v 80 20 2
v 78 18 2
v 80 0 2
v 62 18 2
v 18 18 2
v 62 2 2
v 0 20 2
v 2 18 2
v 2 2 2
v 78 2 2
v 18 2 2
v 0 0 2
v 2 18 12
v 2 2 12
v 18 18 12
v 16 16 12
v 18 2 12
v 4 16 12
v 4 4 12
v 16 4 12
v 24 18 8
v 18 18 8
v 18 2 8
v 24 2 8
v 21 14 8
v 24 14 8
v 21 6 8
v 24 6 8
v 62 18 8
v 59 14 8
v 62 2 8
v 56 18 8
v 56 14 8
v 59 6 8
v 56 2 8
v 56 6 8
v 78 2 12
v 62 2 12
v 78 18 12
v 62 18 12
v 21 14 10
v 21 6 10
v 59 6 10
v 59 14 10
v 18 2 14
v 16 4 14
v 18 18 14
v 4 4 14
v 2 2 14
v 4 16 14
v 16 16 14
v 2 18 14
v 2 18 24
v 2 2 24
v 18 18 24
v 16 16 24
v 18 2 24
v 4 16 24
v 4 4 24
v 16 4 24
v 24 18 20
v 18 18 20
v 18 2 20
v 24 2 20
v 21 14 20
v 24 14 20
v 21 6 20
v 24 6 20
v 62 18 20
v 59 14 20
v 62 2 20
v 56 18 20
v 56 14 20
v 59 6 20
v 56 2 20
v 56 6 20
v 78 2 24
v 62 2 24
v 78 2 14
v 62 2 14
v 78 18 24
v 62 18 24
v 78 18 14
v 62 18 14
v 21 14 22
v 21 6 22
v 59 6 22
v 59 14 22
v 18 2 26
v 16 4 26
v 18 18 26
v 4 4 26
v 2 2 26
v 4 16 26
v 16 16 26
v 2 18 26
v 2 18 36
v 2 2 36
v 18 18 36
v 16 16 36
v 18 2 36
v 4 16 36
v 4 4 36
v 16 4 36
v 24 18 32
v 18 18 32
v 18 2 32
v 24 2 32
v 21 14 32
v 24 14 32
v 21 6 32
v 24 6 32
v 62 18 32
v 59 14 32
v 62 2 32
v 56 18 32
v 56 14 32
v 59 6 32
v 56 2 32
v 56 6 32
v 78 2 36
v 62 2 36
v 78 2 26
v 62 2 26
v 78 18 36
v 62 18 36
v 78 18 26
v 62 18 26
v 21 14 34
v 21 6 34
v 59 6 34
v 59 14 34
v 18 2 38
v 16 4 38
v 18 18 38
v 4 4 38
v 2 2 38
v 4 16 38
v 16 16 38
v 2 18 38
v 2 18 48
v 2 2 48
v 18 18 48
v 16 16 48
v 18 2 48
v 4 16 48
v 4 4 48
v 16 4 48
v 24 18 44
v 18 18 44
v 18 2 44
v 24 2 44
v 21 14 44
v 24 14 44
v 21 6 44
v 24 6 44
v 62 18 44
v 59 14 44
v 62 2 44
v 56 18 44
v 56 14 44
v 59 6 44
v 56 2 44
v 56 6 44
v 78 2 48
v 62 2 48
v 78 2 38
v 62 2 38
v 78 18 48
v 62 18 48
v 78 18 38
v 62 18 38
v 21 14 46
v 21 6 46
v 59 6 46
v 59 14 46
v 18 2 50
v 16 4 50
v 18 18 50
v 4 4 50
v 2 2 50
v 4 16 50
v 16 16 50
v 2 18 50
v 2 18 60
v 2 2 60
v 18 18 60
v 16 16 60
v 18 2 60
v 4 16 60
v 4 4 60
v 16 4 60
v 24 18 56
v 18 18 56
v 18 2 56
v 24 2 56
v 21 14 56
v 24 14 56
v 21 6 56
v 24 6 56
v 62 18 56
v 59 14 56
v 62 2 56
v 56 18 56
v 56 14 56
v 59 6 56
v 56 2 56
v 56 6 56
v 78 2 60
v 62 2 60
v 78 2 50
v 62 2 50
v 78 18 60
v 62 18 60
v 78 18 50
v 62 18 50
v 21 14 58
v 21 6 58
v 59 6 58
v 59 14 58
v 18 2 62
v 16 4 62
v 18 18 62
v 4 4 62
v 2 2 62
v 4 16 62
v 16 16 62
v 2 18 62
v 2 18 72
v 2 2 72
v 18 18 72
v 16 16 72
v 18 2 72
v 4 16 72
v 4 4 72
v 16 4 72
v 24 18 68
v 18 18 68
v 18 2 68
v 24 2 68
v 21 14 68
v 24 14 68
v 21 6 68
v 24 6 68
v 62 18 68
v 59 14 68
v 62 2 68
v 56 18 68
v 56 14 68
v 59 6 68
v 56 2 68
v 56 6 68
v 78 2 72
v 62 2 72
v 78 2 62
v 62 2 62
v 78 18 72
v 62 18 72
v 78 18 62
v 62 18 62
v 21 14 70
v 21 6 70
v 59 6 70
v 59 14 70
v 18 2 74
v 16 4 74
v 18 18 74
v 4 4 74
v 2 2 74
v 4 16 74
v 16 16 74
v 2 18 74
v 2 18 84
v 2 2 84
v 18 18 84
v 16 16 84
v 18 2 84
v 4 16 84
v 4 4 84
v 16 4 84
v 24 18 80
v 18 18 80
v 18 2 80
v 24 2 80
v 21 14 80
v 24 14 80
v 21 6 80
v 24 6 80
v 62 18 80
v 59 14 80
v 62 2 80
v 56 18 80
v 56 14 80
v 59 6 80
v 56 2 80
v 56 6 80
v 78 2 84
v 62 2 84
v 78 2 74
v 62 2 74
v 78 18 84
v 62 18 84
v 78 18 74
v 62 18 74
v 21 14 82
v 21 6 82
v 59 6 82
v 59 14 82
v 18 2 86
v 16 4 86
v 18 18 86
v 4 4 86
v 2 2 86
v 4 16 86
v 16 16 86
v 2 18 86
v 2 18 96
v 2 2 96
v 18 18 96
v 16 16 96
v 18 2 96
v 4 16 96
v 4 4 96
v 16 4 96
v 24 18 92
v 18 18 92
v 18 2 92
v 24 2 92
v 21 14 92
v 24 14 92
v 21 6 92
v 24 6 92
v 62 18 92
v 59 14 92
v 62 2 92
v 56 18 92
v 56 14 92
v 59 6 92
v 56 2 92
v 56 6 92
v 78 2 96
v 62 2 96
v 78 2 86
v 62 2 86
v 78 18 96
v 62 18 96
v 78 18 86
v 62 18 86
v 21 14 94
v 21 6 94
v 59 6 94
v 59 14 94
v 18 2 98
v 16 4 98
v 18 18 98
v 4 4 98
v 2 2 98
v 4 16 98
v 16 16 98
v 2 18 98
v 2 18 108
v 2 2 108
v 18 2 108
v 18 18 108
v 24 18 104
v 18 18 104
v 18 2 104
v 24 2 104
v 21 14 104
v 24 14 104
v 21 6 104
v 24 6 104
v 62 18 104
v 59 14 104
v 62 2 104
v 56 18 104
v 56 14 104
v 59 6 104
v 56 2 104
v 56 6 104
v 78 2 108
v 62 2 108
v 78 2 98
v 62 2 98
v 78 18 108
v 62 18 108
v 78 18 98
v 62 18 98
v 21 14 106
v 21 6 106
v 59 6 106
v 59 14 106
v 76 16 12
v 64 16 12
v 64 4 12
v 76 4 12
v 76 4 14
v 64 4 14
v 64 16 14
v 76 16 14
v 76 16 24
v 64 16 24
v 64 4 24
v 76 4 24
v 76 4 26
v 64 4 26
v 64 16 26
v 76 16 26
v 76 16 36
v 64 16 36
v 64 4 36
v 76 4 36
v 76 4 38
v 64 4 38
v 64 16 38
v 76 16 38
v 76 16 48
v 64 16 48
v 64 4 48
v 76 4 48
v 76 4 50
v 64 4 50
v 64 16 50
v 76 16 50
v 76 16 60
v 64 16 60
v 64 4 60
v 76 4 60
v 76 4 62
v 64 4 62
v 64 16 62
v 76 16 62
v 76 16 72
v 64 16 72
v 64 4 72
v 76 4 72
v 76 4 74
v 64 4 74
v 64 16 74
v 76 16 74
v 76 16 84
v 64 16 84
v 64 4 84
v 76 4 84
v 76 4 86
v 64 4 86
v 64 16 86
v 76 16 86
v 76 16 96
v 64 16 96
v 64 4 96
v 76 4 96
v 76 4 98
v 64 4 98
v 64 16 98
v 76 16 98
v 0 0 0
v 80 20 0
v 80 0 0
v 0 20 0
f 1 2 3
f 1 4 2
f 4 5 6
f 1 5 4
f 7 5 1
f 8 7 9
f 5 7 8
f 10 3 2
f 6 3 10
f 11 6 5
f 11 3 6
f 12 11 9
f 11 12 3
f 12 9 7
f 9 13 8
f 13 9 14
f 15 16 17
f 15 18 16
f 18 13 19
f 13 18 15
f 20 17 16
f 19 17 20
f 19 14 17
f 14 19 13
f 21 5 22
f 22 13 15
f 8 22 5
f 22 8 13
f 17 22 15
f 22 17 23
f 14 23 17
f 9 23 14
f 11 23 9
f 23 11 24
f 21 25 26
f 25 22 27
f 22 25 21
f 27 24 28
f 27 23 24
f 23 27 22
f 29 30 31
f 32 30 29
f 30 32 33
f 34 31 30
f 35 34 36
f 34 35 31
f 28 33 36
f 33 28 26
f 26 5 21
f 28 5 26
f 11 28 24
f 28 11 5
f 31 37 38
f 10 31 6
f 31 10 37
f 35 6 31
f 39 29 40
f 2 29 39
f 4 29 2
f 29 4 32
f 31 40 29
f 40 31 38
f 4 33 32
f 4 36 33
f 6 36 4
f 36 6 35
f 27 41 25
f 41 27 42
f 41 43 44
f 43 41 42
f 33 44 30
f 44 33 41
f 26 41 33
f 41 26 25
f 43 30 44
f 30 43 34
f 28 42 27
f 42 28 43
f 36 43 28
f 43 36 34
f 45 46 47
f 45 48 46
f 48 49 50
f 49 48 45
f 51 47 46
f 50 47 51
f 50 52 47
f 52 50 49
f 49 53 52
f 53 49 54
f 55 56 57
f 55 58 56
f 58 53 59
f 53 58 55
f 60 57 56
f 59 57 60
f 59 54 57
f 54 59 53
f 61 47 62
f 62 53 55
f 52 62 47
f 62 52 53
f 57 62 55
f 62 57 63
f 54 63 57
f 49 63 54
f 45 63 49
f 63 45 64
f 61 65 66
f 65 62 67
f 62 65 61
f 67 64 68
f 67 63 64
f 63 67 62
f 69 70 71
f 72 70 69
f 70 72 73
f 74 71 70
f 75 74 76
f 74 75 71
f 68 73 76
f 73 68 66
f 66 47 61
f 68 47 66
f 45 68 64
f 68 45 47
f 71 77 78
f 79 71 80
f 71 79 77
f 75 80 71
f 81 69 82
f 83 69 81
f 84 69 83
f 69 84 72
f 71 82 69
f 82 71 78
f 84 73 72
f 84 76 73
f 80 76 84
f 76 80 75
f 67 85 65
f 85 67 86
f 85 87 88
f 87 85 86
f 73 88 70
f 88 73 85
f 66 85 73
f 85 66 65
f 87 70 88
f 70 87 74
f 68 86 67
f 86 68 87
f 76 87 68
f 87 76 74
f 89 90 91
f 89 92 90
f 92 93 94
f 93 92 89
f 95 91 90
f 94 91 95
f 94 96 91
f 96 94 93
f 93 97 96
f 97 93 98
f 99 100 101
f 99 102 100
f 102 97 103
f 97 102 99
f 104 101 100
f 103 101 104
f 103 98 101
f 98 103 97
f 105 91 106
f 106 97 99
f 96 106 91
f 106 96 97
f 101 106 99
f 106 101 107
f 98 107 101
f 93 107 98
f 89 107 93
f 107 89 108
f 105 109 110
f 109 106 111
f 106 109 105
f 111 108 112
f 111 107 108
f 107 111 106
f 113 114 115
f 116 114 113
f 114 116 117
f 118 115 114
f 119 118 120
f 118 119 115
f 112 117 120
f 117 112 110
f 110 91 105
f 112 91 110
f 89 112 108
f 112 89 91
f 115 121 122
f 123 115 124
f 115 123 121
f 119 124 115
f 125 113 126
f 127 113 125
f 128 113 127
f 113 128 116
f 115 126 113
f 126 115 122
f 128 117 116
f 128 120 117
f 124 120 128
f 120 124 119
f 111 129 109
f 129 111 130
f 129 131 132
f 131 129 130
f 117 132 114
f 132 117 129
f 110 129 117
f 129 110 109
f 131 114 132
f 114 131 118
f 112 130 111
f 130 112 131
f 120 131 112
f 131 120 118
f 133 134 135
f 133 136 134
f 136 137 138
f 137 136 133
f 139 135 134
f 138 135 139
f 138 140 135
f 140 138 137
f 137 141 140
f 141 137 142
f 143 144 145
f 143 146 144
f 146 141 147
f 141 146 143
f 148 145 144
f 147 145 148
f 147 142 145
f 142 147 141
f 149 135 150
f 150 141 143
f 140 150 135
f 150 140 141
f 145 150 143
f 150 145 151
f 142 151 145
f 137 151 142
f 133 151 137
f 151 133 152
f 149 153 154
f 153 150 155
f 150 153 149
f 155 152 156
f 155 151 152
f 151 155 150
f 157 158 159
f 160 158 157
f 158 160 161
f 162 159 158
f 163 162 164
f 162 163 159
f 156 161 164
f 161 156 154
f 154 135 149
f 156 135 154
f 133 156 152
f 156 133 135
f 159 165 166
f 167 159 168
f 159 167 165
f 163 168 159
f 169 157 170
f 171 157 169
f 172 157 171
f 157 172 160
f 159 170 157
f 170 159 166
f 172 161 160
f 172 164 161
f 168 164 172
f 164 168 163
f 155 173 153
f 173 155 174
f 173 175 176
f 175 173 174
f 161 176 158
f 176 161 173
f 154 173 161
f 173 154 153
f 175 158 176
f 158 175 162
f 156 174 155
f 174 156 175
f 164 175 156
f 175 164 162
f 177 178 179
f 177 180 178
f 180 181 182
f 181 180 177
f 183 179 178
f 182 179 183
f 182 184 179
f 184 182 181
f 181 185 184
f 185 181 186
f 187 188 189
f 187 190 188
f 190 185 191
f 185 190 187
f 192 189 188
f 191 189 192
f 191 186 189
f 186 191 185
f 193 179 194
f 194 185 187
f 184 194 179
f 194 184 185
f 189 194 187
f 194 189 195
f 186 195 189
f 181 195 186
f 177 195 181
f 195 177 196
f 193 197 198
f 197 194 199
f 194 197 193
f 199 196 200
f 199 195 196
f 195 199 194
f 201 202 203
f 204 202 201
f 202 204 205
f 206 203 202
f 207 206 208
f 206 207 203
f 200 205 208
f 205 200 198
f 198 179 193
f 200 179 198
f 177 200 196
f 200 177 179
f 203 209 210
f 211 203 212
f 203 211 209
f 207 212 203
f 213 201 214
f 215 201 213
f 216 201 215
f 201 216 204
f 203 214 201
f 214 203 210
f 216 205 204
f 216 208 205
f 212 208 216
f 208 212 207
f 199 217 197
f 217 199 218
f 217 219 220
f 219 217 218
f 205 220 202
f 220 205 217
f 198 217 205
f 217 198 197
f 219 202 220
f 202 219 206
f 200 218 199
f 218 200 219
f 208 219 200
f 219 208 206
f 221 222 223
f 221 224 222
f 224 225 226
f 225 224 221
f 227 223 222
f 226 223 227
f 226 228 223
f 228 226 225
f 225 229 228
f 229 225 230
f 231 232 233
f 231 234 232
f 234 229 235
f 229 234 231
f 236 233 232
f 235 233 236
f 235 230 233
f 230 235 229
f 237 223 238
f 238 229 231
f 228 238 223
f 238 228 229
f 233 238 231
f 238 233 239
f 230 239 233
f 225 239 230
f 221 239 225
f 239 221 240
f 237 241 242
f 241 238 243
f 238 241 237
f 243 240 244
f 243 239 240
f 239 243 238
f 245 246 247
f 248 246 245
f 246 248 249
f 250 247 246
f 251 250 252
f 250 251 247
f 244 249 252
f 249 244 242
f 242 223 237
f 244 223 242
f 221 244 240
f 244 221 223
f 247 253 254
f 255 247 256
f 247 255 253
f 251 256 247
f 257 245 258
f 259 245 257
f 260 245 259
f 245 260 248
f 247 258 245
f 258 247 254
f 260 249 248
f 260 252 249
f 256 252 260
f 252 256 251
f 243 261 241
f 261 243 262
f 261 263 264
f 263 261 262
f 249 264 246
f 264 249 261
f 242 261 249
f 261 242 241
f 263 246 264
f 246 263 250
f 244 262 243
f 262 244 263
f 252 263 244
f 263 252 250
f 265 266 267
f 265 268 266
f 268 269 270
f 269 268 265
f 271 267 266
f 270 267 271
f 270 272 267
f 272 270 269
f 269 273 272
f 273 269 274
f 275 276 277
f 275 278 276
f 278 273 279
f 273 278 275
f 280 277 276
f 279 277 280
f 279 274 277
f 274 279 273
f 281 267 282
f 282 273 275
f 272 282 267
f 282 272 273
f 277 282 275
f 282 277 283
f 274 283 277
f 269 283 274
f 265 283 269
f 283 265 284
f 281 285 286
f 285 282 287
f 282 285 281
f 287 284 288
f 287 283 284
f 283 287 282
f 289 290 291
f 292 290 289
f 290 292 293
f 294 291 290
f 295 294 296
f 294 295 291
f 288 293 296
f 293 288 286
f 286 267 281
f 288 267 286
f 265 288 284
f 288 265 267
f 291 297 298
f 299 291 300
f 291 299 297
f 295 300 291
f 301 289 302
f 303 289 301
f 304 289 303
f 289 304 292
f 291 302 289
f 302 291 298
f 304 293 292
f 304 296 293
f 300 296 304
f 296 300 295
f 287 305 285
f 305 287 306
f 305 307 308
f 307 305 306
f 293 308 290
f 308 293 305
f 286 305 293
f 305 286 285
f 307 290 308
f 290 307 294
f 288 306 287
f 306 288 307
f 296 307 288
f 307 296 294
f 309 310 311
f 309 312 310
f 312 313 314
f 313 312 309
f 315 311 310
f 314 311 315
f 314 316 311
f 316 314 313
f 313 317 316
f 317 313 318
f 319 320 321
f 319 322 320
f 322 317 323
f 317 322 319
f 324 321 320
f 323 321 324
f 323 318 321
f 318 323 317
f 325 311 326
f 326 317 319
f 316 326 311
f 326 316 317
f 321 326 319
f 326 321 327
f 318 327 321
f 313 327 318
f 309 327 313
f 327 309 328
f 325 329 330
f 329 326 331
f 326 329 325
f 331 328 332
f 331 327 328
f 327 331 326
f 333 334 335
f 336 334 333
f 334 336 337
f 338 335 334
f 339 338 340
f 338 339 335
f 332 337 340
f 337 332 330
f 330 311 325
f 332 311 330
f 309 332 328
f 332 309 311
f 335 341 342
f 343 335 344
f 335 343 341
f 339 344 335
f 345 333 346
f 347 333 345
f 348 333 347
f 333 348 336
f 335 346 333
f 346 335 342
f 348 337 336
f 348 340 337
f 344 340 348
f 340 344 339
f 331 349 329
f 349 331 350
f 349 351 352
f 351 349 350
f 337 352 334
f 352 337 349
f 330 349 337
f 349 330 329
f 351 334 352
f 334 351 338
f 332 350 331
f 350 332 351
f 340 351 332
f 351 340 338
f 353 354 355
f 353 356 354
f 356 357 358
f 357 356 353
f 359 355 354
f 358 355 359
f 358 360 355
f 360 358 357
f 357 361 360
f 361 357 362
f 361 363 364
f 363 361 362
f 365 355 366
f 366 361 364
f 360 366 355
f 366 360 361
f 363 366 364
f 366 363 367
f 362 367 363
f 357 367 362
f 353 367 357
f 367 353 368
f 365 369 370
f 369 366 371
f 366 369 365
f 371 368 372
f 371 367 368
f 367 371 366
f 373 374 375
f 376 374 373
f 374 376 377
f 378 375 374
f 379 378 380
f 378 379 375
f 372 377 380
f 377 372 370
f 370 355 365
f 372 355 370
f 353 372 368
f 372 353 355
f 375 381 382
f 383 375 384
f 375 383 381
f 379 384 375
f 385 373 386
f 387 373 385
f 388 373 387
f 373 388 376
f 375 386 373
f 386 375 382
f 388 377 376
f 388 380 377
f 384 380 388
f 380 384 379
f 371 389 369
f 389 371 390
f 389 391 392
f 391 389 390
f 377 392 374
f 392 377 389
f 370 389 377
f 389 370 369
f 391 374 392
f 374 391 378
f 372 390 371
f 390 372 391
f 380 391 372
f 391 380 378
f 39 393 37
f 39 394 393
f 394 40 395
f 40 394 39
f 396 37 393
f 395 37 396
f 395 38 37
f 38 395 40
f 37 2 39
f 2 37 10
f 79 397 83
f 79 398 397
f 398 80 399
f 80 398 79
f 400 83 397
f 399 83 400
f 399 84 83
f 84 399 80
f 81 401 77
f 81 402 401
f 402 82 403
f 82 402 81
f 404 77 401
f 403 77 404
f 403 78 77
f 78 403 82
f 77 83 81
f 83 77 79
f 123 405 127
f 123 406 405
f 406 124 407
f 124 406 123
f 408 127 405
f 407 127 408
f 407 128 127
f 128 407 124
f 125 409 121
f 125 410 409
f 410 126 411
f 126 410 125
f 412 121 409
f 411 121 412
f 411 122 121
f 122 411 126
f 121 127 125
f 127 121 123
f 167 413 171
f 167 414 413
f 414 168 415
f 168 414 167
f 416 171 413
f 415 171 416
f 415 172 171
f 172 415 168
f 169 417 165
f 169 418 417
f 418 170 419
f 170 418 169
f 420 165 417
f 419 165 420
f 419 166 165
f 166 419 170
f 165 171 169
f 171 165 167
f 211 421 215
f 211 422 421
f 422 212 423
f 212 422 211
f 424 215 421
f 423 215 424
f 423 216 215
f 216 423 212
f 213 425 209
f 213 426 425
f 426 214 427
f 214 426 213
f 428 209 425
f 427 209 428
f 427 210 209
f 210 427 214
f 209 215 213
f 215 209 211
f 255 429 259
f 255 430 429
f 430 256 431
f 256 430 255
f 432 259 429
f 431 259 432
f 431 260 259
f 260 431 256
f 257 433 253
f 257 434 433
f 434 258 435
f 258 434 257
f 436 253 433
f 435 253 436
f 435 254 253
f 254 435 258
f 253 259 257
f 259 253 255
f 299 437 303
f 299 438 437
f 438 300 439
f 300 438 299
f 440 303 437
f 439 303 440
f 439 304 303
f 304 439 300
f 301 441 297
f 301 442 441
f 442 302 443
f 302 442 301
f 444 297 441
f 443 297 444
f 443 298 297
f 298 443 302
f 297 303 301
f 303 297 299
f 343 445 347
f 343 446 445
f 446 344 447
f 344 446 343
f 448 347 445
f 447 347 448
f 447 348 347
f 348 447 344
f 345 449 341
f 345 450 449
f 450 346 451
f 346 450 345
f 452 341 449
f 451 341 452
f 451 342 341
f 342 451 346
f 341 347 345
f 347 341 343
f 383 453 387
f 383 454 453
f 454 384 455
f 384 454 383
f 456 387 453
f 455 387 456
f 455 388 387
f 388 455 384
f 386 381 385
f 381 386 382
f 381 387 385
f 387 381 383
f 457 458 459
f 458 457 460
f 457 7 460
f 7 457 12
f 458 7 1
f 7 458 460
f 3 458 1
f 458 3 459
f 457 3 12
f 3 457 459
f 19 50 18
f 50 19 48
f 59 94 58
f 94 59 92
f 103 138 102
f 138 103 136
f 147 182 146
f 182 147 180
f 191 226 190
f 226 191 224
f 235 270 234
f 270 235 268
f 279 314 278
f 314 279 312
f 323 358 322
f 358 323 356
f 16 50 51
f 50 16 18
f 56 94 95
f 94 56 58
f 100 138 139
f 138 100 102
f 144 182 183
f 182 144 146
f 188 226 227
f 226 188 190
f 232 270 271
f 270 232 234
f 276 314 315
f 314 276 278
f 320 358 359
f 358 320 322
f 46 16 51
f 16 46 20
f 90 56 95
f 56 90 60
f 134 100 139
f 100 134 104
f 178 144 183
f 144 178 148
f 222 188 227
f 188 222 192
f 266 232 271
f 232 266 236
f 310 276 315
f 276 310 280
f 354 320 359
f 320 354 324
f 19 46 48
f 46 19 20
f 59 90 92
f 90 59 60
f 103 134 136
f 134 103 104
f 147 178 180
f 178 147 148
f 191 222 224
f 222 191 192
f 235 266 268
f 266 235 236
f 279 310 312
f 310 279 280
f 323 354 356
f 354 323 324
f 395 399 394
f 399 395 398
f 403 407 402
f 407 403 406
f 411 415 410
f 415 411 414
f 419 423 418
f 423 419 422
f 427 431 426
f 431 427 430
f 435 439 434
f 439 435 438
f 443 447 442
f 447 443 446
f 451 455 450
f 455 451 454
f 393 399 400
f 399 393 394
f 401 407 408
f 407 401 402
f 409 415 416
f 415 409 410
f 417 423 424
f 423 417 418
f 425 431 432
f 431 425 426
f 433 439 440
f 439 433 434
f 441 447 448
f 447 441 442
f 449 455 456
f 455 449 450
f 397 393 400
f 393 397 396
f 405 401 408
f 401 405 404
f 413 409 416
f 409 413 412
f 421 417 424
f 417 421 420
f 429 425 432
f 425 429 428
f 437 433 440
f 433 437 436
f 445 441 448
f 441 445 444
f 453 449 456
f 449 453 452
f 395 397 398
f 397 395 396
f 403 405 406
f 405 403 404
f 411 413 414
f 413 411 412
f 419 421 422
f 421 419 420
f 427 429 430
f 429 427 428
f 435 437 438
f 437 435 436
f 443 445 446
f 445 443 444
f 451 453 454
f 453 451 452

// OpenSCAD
/*

	parametric temp tower - http://fns.csokolade.hu

	Use tempInjector.py from https://github.com/fablabnbg/tronxy-xy100 to inject temperatures into generated GCODE file.
	tempInjector.py parameters used in this temp_tower.scad file:

	STARTTEMP = temp (240)
	TEMP_INCREMENTS = inc (-5)
	TEMP_STEPS_HEIGHT_MM = z_bridgesole (2)
	BASE_HEIGHT_MM = z_sole (10)

*/

// temp tower steps
temp = 240;
inc = -5;
steps = 8;

// bottom sole:
x_sole = 80;
y_sole = 20;
z_sole = 2;

// pillars with bridge soles
xygap_pillars = 4;
xy_pillars = y_sole - 2 * xygap_pillars;
xygap_bridgesole = 2;
xy_bridgesole = y_sole - 2 * xygap_bridgesole;
z_bridgesole = 10;

// bridge definition
gap_bridge = 1; // 
zgap_bridge = 2; // gap between bridge soles
z_bridge = z_bridgesole + zgap_bridge;

xz_support = 6;
y_plank = 8;
z_plank = 2;


union() {
	// tower sole
	linear_extrude(height=z_sole) square(size=[x_sole, y_sole]);

	// left pillar
	translate([4, 4, 0]) linear_extrude(height=steps * (z_bridge + gap_bridge)) square(size=[xy_pillars, xy_pillars]);

	// right pillar
	translate([x_sole - xy_pillars - 4, 4, 0]) linear_extrude(height=steps * (z_bridge + gap_bridge)) square(size=[xy_pillars, xy_pillars]);

	// ladder
	for (i = [0 : steps]) {
		// left bridge sole with numbers
		difference() {
			translate([(y_sole - xy_bridgesole) / 2, (y_sole - xy_bridgesole) / 2, z_sole + i * z_bridge]) leg(); // left
			translate([(y_sole - xy_bridgesole) / 2 + 1, (y_sole - xy_bridgesole) / 2+2, z_sole + i * z_bridge +2]) {
				// title
				//rotate([90, 0, 0]) linear_extrude(3) text(str(temp + i * inc), size = 6);
			}
		}

		// right bridge sole
		translate([x_sole - xy_bridgesole - (y_sole - xy_bridgesole) / 2, (y_sole - xy_bridgesole) / 2, z_sole + i * z_bridge]) leg(); // right
		
		// bridge
		//translate([xy_bridgesole + xygap_bridgesole, 0, (i+1)*z_bridge - 4]) bridge(i); 
		translate([xygap_bridgesole + xy_bridgesole, y_sole / 2- xy_bridgesole/2 , (i+1)*z_bridge - 4]) bridge(i); 
	}	
}


module leg() {
	linear_extrude(height = z_bridgesole) square(size = [xy_bridgesole, xy_bridgesole]);
}

module bridge(i) {
	x_bridge = x_sole - 2 * xy_bridgesole - 2 * xygap_bridgesole;
	x_plank = x_bridge - xz_support;

	// left mount
	rotate([-90,0,0]) linear_extrude(height = xy_bridgesole) polygon(points=[[0, 0], [xz_support,0], [0,xz_support]]);

	// right mount
	translate([x_plank,0,0]) rotate([-90,0,0]) linear_extrude(height=xy_bridgesole) polygon(points=[[0, 0], [xz_support, xz_support], [xz_support,0]]);

	// bridge
	translate([(x_bridge - x_plank)/2, (xy_bridgesole-y_plank)/2, 0]) linear_extrude(height=z_plank) square(size=[x_plank, y_plank]);
}
